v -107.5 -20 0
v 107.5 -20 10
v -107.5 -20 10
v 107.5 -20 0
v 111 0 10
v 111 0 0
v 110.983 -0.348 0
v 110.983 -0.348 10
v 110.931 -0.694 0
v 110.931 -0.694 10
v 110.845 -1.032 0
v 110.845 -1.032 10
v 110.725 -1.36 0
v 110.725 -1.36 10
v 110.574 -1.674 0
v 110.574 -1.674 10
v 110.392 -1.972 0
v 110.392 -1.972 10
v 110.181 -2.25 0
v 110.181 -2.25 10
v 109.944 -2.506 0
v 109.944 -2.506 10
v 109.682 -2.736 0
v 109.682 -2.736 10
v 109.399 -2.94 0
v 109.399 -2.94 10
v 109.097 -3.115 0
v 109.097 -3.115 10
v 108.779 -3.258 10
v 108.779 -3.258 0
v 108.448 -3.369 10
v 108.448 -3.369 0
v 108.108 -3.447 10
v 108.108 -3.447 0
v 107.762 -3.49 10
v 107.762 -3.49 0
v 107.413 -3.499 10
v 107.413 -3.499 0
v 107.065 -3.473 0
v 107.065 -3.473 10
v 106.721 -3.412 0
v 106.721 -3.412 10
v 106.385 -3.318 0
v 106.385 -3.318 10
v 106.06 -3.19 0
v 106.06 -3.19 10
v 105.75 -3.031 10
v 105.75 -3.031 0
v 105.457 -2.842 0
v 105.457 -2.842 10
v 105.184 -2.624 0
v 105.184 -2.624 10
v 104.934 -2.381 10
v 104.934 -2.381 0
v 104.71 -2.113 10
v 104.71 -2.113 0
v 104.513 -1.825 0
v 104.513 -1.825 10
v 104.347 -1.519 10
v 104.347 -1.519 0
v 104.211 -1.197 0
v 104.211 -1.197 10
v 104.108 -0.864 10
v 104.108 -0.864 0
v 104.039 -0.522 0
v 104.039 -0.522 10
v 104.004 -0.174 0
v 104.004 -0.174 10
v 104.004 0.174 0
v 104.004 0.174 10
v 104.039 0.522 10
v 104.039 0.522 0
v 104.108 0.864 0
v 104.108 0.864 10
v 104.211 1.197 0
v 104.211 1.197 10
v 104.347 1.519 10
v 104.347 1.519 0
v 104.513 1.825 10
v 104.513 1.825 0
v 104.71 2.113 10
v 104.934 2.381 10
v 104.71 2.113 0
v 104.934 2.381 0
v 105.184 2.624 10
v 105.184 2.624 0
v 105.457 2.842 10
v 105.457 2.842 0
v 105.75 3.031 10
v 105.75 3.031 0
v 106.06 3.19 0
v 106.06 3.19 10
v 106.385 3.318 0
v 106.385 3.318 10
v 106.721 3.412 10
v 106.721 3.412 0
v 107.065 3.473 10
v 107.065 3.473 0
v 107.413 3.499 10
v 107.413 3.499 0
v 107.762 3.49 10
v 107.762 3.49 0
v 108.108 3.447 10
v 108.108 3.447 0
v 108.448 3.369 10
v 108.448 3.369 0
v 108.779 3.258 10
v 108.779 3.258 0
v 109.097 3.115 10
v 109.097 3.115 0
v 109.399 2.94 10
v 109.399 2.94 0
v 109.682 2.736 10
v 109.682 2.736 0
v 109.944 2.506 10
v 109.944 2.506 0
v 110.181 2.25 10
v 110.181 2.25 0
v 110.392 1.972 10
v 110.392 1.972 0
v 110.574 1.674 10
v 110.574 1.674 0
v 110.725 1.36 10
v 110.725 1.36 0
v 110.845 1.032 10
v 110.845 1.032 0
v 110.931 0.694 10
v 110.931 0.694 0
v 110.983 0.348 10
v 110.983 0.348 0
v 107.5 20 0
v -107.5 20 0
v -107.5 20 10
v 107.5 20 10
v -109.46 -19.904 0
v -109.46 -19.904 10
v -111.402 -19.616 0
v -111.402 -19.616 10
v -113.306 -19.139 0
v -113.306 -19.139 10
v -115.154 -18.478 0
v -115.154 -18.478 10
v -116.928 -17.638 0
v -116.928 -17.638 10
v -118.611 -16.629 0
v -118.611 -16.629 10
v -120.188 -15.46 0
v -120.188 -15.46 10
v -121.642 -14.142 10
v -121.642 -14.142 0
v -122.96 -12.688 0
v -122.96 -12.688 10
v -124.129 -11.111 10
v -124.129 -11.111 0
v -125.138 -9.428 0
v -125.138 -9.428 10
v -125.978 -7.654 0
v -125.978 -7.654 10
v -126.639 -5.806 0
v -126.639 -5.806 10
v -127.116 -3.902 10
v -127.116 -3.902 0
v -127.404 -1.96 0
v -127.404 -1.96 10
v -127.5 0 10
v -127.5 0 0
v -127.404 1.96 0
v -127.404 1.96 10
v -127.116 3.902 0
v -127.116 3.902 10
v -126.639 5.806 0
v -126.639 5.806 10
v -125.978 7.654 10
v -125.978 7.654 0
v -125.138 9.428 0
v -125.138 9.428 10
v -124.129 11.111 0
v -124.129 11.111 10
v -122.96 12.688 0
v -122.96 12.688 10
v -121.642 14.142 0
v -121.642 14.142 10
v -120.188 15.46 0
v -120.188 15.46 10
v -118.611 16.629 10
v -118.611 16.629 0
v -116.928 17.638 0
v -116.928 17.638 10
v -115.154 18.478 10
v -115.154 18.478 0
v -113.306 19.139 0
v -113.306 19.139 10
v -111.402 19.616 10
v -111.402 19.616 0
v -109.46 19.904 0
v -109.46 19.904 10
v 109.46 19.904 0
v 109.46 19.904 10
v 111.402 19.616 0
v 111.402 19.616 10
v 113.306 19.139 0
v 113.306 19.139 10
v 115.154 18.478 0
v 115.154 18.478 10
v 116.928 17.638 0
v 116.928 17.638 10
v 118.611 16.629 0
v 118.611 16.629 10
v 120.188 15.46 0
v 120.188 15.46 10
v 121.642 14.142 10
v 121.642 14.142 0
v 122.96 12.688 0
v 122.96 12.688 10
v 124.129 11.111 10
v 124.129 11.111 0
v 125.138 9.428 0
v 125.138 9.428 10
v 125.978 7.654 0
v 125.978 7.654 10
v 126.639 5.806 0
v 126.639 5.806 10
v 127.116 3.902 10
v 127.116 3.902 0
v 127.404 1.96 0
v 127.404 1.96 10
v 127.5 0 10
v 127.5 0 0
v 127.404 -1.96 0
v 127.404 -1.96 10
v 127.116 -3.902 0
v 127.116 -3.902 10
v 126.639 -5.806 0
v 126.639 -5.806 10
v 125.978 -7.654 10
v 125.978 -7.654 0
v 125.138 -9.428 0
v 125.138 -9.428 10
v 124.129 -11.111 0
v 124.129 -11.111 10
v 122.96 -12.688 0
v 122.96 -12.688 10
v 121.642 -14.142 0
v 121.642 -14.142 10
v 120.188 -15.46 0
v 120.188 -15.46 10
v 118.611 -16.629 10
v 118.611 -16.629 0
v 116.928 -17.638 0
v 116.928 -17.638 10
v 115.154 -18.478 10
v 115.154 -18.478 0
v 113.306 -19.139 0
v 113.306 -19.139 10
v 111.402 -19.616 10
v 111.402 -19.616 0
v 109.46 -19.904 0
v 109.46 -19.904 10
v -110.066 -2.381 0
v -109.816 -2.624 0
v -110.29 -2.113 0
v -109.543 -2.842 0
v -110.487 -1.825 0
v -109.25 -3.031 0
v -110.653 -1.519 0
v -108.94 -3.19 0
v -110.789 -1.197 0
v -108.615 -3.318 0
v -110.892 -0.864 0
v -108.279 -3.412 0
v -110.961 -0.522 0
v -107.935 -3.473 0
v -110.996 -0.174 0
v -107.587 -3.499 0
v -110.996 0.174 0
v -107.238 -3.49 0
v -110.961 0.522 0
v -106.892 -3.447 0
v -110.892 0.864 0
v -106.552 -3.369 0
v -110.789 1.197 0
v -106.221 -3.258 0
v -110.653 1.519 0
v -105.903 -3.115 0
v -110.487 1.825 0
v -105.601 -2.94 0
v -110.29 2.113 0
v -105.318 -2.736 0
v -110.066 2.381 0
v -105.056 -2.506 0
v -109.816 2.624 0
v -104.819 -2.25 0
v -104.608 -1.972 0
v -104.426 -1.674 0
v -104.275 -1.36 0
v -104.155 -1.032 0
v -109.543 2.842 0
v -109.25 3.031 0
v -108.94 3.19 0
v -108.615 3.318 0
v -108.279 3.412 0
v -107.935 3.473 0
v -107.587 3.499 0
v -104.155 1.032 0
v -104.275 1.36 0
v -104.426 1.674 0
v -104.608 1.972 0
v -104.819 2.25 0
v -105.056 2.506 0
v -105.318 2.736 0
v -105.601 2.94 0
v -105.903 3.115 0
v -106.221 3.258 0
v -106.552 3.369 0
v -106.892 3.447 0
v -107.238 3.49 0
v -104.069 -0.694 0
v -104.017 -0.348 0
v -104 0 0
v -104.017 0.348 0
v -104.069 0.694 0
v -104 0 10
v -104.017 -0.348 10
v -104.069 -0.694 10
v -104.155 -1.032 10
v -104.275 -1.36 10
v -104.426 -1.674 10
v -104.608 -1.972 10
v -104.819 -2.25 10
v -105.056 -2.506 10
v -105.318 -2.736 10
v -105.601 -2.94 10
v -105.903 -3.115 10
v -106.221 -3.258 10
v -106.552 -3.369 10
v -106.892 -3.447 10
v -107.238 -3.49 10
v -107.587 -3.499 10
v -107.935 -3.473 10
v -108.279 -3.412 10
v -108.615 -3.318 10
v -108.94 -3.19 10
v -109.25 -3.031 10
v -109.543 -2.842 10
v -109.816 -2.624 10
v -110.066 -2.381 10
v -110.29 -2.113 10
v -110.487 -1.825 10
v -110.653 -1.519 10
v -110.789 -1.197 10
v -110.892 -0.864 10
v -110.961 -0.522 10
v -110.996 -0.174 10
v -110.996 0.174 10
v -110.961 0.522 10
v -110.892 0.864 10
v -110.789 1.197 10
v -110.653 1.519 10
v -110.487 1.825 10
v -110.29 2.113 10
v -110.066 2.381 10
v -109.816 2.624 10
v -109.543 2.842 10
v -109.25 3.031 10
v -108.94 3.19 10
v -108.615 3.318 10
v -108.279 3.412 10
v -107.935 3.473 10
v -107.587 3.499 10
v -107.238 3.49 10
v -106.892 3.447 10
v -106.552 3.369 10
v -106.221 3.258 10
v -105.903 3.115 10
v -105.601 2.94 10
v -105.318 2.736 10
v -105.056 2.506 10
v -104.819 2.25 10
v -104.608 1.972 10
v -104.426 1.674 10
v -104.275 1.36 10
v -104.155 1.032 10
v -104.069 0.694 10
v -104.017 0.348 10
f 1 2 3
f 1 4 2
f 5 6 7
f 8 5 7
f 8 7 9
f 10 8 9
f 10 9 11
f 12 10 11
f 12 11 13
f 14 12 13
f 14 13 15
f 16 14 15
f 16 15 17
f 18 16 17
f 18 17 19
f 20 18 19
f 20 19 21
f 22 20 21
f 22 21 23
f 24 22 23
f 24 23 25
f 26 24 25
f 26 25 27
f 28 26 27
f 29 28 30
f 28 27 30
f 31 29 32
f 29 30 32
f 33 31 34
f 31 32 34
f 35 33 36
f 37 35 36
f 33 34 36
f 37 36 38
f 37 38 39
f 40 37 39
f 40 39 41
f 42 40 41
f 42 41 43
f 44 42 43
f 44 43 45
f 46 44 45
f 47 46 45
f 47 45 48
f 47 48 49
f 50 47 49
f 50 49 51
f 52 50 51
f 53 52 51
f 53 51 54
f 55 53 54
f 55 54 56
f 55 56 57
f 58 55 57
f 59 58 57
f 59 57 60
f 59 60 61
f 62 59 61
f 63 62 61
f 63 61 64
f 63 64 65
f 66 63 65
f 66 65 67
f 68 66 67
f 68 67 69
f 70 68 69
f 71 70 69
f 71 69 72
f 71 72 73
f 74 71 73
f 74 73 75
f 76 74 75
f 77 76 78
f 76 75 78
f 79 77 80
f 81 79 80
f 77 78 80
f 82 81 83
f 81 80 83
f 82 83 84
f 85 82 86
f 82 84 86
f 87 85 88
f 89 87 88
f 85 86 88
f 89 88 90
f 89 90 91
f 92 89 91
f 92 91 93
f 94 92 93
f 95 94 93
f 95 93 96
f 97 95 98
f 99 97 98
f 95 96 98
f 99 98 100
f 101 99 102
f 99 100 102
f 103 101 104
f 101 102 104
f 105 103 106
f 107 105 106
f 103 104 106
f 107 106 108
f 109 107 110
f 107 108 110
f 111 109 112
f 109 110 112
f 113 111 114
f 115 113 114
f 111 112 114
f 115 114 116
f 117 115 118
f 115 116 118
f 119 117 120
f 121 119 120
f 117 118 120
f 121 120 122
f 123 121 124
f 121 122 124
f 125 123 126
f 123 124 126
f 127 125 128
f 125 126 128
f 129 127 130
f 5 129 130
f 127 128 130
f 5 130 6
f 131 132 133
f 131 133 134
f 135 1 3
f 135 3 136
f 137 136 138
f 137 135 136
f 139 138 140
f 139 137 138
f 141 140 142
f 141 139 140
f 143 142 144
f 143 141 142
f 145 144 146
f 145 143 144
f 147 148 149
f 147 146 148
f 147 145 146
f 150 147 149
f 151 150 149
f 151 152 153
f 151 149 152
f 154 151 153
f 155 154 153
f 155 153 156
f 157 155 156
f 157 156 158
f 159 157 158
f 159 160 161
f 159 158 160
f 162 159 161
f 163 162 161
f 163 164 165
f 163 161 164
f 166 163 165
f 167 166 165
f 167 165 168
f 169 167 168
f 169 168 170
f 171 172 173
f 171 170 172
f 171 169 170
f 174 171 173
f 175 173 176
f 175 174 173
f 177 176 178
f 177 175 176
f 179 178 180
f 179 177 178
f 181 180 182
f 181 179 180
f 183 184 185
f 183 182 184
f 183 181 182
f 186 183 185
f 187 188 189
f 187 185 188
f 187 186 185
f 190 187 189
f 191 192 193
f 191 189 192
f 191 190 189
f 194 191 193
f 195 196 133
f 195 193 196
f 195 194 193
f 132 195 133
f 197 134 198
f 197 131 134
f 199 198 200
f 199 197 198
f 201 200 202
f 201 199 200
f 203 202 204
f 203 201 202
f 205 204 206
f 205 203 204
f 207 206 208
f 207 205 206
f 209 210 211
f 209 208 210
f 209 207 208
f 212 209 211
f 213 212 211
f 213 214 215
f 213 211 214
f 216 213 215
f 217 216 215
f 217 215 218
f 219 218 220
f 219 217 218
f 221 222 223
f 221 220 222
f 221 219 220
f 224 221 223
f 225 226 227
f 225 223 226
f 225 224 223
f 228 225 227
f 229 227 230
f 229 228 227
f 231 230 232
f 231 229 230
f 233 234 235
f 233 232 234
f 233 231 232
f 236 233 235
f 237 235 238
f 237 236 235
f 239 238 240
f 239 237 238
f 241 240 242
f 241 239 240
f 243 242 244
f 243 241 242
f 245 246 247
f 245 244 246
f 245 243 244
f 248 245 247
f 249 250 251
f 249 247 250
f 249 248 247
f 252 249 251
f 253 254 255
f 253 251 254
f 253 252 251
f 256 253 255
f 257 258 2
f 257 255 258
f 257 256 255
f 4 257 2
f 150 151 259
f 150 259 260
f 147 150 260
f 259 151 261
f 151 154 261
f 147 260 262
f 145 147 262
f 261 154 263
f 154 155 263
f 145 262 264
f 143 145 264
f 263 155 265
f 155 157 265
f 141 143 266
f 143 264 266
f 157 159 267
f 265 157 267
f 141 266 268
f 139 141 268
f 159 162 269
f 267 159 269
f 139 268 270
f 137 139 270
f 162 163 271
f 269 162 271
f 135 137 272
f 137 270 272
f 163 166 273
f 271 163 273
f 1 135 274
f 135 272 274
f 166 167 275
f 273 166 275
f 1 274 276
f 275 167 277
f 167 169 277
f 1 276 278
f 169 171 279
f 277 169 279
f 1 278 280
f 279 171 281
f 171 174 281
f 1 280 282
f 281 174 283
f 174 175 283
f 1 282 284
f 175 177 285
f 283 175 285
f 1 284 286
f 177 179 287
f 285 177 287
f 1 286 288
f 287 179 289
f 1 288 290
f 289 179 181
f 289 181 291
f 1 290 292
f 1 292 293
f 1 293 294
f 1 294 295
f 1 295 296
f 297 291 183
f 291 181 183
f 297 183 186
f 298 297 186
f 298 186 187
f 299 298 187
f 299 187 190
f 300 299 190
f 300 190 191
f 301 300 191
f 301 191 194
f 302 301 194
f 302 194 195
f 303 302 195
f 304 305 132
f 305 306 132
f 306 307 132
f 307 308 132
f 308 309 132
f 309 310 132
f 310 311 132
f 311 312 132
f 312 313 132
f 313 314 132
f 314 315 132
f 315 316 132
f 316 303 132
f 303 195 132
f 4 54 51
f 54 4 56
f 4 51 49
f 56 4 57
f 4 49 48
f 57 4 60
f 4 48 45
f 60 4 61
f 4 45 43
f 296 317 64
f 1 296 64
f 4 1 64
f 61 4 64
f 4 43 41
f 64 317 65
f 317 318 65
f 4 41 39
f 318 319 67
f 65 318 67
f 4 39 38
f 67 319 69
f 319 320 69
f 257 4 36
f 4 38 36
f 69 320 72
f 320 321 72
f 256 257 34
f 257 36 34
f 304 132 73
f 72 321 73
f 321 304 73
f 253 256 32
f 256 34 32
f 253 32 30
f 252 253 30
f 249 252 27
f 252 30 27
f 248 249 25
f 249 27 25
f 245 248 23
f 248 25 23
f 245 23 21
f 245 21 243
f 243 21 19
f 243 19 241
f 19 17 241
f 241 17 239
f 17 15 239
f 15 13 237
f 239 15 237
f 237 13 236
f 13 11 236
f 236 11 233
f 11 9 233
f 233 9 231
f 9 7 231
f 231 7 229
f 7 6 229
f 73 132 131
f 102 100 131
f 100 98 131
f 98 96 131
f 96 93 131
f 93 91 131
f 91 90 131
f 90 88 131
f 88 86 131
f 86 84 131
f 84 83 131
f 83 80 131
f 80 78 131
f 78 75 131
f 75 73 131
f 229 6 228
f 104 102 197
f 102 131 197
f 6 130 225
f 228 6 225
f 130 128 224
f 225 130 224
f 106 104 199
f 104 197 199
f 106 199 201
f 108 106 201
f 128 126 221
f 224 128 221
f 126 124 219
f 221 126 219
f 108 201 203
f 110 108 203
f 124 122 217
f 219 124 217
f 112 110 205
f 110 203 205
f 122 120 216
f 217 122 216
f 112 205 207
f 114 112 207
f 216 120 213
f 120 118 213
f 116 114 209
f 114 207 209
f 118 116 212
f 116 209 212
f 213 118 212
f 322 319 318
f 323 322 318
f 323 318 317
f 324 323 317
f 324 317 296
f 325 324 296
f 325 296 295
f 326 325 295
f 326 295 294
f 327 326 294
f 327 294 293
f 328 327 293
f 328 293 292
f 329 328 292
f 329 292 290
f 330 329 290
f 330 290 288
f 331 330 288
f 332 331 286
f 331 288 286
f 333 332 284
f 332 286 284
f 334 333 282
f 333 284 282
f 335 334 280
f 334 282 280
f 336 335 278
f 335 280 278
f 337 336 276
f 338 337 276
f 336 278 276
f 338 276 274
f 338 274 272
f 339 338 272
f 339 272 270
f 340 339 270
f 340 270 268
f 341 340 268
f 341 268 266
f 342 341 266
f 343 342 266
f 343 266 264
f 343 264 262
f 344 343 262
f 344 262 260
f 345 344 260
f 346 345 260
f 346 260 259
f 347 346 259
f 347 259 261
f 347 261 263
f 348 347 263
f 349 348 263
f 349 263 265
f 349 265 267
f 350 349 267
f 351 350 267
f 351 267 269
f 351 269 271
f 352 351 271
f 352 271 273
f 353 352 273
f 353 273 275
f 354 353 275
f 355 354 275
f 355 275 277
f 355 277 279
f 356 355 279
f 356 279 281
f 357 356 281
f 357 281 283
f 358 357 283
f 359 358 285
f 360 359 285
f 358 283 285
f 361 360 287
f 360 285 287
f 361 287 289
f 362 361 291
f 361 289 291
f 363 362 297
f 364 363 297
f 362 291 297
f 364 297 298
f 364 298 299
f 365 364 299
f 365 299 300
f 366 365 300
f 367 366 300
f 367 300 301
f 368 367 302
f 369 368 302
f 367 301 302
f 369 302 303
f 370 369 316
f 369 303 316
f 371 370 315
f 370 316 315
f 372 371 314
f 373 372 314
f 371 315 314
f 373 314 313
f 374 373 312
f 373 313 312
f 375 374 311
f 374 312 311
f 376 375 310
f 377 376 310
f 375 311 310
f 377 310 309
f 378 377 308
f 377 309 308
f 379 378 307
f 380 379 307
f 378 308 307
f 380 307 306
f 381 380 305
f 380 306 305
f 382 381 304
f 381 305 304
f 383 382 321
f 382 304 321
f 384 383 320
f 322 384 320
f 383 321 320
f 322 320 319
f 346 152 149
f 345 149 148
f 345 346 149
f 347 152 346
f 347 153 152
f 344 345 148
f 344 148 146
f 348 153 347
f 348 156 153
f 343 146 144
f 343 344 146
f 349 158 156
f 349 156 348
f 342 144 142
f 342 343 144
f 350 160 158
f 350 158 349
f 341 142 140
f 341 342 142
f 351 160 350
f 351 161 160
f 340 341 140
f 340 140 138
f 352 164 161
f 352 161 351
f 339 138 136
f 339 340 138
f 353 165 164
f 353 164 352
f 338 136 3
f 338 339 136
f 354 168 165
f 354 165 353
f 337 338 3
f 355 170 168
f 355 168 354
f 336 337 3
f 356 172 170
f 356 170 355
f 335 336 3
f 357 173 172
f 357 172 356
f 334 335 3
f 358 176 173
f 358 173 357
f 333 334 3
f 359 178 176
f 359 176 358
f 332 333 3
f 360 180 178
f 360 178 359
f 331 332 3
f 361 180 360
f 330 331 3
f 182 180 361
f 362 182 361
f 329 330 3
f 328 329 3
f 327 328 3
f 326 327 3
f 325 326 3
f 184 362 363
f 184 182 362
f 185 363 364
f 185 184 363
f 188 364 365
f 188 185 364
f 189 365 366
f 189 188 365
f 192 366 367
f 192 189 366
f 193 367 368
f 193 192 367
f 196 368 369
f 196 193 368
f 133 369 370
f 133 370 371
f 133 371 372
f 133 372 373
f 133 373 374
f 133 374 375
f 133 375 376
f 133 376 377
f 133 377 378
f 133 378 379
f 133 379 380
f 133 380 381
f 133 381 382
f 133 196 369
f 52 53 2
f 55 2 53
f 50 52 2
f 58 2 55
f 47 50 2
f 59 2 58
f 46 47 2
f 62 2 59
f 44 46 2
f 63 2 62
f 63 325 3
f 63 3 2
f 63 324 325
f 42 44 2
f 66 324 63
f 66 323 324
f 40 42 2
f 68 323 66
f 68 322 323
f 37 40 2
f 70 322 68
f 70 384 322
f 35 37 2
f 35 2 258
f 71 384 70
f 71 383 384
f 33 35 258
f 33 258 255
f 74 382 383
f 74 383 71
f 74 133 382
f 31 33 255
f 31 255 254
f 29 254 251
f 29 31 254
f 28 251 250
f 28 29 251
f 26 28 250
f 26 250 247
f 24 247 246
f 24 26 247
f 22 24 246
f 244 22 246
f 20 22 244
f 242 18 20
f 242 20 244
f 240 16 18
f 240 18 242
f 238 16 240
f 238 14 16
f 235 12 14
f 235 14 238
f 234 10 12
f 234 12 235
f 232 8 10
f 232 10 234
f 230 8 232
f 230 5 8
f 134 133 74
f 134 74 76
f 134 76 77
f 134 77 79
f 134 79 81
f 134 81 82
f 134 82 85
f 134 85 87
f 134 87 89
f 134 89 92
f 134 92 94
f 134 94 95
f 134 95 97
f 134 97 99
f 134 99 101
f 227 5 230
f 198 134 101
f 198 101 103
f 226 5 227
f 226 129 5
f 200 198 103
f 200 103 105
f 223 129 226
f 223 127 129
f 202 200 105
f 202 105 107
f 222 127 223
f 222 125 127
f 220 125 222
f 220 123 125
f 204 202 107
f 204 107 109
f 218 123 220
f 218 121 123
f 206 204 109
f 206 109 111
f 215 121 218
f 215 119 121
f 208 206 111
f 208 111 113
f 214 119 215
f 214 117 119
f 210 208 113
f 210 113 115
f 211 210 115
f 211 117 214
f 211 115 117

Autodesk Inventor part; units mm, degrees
ref_plane "YZ Plane" through (0, 0, 0) normal (1, 0, 0) x (0, 1, 0)
ref_plane "XZ Plane" through (0, 0, 0) normal (0, 1, 0) x (-1, 0, 0)
ref_plane "XY Plane" through (0, 0, 0) normal (0, 0, 1) x (1, 0, 0)
sketch "Sketch1" plane through (0, 0, 0) normal (0, 0, 1) x (1, 0, 0)
  line L0 (107.5, -20) -> (-107.5, -20)
  line L1 (-107.5, -20) -> (-107.5, 20)
  line L2 (-107.5, 20) -> (107.5, 20)
  line L3 (107.5, 20) -> (107.5, -20)
  line L4 (107.5, -20) -> (-107.5, 20) construction
  line L5 (-107.5, -20) -> (107.5, 20) construction
  arc A0 (-107.5, 20) -> (-107.5, -20) centre (-107.5, 0) ccw
  arc A1 (107.5, -20) -> (107.5, 20) centre (107.5, 0) ccw
  circle A2 centre (-107.5, 0) radius 3.5
  circle A3 centre (107.5, 0) radius 3.5
  point P0 (0, 0)
  dimension "d0" = 215
  dimension "d1" = 40
  dimension "d4" = 7
  dimension "d5" = 7
extrude "Extrusion1" add sketch "Sketch1" along normal blind 10 contours L0 L1 A2 L2 L3 A3 | L3 A3 A1 | A0 L1 A2
properties part number "Eslabon" material "Acetal Resin, White"
